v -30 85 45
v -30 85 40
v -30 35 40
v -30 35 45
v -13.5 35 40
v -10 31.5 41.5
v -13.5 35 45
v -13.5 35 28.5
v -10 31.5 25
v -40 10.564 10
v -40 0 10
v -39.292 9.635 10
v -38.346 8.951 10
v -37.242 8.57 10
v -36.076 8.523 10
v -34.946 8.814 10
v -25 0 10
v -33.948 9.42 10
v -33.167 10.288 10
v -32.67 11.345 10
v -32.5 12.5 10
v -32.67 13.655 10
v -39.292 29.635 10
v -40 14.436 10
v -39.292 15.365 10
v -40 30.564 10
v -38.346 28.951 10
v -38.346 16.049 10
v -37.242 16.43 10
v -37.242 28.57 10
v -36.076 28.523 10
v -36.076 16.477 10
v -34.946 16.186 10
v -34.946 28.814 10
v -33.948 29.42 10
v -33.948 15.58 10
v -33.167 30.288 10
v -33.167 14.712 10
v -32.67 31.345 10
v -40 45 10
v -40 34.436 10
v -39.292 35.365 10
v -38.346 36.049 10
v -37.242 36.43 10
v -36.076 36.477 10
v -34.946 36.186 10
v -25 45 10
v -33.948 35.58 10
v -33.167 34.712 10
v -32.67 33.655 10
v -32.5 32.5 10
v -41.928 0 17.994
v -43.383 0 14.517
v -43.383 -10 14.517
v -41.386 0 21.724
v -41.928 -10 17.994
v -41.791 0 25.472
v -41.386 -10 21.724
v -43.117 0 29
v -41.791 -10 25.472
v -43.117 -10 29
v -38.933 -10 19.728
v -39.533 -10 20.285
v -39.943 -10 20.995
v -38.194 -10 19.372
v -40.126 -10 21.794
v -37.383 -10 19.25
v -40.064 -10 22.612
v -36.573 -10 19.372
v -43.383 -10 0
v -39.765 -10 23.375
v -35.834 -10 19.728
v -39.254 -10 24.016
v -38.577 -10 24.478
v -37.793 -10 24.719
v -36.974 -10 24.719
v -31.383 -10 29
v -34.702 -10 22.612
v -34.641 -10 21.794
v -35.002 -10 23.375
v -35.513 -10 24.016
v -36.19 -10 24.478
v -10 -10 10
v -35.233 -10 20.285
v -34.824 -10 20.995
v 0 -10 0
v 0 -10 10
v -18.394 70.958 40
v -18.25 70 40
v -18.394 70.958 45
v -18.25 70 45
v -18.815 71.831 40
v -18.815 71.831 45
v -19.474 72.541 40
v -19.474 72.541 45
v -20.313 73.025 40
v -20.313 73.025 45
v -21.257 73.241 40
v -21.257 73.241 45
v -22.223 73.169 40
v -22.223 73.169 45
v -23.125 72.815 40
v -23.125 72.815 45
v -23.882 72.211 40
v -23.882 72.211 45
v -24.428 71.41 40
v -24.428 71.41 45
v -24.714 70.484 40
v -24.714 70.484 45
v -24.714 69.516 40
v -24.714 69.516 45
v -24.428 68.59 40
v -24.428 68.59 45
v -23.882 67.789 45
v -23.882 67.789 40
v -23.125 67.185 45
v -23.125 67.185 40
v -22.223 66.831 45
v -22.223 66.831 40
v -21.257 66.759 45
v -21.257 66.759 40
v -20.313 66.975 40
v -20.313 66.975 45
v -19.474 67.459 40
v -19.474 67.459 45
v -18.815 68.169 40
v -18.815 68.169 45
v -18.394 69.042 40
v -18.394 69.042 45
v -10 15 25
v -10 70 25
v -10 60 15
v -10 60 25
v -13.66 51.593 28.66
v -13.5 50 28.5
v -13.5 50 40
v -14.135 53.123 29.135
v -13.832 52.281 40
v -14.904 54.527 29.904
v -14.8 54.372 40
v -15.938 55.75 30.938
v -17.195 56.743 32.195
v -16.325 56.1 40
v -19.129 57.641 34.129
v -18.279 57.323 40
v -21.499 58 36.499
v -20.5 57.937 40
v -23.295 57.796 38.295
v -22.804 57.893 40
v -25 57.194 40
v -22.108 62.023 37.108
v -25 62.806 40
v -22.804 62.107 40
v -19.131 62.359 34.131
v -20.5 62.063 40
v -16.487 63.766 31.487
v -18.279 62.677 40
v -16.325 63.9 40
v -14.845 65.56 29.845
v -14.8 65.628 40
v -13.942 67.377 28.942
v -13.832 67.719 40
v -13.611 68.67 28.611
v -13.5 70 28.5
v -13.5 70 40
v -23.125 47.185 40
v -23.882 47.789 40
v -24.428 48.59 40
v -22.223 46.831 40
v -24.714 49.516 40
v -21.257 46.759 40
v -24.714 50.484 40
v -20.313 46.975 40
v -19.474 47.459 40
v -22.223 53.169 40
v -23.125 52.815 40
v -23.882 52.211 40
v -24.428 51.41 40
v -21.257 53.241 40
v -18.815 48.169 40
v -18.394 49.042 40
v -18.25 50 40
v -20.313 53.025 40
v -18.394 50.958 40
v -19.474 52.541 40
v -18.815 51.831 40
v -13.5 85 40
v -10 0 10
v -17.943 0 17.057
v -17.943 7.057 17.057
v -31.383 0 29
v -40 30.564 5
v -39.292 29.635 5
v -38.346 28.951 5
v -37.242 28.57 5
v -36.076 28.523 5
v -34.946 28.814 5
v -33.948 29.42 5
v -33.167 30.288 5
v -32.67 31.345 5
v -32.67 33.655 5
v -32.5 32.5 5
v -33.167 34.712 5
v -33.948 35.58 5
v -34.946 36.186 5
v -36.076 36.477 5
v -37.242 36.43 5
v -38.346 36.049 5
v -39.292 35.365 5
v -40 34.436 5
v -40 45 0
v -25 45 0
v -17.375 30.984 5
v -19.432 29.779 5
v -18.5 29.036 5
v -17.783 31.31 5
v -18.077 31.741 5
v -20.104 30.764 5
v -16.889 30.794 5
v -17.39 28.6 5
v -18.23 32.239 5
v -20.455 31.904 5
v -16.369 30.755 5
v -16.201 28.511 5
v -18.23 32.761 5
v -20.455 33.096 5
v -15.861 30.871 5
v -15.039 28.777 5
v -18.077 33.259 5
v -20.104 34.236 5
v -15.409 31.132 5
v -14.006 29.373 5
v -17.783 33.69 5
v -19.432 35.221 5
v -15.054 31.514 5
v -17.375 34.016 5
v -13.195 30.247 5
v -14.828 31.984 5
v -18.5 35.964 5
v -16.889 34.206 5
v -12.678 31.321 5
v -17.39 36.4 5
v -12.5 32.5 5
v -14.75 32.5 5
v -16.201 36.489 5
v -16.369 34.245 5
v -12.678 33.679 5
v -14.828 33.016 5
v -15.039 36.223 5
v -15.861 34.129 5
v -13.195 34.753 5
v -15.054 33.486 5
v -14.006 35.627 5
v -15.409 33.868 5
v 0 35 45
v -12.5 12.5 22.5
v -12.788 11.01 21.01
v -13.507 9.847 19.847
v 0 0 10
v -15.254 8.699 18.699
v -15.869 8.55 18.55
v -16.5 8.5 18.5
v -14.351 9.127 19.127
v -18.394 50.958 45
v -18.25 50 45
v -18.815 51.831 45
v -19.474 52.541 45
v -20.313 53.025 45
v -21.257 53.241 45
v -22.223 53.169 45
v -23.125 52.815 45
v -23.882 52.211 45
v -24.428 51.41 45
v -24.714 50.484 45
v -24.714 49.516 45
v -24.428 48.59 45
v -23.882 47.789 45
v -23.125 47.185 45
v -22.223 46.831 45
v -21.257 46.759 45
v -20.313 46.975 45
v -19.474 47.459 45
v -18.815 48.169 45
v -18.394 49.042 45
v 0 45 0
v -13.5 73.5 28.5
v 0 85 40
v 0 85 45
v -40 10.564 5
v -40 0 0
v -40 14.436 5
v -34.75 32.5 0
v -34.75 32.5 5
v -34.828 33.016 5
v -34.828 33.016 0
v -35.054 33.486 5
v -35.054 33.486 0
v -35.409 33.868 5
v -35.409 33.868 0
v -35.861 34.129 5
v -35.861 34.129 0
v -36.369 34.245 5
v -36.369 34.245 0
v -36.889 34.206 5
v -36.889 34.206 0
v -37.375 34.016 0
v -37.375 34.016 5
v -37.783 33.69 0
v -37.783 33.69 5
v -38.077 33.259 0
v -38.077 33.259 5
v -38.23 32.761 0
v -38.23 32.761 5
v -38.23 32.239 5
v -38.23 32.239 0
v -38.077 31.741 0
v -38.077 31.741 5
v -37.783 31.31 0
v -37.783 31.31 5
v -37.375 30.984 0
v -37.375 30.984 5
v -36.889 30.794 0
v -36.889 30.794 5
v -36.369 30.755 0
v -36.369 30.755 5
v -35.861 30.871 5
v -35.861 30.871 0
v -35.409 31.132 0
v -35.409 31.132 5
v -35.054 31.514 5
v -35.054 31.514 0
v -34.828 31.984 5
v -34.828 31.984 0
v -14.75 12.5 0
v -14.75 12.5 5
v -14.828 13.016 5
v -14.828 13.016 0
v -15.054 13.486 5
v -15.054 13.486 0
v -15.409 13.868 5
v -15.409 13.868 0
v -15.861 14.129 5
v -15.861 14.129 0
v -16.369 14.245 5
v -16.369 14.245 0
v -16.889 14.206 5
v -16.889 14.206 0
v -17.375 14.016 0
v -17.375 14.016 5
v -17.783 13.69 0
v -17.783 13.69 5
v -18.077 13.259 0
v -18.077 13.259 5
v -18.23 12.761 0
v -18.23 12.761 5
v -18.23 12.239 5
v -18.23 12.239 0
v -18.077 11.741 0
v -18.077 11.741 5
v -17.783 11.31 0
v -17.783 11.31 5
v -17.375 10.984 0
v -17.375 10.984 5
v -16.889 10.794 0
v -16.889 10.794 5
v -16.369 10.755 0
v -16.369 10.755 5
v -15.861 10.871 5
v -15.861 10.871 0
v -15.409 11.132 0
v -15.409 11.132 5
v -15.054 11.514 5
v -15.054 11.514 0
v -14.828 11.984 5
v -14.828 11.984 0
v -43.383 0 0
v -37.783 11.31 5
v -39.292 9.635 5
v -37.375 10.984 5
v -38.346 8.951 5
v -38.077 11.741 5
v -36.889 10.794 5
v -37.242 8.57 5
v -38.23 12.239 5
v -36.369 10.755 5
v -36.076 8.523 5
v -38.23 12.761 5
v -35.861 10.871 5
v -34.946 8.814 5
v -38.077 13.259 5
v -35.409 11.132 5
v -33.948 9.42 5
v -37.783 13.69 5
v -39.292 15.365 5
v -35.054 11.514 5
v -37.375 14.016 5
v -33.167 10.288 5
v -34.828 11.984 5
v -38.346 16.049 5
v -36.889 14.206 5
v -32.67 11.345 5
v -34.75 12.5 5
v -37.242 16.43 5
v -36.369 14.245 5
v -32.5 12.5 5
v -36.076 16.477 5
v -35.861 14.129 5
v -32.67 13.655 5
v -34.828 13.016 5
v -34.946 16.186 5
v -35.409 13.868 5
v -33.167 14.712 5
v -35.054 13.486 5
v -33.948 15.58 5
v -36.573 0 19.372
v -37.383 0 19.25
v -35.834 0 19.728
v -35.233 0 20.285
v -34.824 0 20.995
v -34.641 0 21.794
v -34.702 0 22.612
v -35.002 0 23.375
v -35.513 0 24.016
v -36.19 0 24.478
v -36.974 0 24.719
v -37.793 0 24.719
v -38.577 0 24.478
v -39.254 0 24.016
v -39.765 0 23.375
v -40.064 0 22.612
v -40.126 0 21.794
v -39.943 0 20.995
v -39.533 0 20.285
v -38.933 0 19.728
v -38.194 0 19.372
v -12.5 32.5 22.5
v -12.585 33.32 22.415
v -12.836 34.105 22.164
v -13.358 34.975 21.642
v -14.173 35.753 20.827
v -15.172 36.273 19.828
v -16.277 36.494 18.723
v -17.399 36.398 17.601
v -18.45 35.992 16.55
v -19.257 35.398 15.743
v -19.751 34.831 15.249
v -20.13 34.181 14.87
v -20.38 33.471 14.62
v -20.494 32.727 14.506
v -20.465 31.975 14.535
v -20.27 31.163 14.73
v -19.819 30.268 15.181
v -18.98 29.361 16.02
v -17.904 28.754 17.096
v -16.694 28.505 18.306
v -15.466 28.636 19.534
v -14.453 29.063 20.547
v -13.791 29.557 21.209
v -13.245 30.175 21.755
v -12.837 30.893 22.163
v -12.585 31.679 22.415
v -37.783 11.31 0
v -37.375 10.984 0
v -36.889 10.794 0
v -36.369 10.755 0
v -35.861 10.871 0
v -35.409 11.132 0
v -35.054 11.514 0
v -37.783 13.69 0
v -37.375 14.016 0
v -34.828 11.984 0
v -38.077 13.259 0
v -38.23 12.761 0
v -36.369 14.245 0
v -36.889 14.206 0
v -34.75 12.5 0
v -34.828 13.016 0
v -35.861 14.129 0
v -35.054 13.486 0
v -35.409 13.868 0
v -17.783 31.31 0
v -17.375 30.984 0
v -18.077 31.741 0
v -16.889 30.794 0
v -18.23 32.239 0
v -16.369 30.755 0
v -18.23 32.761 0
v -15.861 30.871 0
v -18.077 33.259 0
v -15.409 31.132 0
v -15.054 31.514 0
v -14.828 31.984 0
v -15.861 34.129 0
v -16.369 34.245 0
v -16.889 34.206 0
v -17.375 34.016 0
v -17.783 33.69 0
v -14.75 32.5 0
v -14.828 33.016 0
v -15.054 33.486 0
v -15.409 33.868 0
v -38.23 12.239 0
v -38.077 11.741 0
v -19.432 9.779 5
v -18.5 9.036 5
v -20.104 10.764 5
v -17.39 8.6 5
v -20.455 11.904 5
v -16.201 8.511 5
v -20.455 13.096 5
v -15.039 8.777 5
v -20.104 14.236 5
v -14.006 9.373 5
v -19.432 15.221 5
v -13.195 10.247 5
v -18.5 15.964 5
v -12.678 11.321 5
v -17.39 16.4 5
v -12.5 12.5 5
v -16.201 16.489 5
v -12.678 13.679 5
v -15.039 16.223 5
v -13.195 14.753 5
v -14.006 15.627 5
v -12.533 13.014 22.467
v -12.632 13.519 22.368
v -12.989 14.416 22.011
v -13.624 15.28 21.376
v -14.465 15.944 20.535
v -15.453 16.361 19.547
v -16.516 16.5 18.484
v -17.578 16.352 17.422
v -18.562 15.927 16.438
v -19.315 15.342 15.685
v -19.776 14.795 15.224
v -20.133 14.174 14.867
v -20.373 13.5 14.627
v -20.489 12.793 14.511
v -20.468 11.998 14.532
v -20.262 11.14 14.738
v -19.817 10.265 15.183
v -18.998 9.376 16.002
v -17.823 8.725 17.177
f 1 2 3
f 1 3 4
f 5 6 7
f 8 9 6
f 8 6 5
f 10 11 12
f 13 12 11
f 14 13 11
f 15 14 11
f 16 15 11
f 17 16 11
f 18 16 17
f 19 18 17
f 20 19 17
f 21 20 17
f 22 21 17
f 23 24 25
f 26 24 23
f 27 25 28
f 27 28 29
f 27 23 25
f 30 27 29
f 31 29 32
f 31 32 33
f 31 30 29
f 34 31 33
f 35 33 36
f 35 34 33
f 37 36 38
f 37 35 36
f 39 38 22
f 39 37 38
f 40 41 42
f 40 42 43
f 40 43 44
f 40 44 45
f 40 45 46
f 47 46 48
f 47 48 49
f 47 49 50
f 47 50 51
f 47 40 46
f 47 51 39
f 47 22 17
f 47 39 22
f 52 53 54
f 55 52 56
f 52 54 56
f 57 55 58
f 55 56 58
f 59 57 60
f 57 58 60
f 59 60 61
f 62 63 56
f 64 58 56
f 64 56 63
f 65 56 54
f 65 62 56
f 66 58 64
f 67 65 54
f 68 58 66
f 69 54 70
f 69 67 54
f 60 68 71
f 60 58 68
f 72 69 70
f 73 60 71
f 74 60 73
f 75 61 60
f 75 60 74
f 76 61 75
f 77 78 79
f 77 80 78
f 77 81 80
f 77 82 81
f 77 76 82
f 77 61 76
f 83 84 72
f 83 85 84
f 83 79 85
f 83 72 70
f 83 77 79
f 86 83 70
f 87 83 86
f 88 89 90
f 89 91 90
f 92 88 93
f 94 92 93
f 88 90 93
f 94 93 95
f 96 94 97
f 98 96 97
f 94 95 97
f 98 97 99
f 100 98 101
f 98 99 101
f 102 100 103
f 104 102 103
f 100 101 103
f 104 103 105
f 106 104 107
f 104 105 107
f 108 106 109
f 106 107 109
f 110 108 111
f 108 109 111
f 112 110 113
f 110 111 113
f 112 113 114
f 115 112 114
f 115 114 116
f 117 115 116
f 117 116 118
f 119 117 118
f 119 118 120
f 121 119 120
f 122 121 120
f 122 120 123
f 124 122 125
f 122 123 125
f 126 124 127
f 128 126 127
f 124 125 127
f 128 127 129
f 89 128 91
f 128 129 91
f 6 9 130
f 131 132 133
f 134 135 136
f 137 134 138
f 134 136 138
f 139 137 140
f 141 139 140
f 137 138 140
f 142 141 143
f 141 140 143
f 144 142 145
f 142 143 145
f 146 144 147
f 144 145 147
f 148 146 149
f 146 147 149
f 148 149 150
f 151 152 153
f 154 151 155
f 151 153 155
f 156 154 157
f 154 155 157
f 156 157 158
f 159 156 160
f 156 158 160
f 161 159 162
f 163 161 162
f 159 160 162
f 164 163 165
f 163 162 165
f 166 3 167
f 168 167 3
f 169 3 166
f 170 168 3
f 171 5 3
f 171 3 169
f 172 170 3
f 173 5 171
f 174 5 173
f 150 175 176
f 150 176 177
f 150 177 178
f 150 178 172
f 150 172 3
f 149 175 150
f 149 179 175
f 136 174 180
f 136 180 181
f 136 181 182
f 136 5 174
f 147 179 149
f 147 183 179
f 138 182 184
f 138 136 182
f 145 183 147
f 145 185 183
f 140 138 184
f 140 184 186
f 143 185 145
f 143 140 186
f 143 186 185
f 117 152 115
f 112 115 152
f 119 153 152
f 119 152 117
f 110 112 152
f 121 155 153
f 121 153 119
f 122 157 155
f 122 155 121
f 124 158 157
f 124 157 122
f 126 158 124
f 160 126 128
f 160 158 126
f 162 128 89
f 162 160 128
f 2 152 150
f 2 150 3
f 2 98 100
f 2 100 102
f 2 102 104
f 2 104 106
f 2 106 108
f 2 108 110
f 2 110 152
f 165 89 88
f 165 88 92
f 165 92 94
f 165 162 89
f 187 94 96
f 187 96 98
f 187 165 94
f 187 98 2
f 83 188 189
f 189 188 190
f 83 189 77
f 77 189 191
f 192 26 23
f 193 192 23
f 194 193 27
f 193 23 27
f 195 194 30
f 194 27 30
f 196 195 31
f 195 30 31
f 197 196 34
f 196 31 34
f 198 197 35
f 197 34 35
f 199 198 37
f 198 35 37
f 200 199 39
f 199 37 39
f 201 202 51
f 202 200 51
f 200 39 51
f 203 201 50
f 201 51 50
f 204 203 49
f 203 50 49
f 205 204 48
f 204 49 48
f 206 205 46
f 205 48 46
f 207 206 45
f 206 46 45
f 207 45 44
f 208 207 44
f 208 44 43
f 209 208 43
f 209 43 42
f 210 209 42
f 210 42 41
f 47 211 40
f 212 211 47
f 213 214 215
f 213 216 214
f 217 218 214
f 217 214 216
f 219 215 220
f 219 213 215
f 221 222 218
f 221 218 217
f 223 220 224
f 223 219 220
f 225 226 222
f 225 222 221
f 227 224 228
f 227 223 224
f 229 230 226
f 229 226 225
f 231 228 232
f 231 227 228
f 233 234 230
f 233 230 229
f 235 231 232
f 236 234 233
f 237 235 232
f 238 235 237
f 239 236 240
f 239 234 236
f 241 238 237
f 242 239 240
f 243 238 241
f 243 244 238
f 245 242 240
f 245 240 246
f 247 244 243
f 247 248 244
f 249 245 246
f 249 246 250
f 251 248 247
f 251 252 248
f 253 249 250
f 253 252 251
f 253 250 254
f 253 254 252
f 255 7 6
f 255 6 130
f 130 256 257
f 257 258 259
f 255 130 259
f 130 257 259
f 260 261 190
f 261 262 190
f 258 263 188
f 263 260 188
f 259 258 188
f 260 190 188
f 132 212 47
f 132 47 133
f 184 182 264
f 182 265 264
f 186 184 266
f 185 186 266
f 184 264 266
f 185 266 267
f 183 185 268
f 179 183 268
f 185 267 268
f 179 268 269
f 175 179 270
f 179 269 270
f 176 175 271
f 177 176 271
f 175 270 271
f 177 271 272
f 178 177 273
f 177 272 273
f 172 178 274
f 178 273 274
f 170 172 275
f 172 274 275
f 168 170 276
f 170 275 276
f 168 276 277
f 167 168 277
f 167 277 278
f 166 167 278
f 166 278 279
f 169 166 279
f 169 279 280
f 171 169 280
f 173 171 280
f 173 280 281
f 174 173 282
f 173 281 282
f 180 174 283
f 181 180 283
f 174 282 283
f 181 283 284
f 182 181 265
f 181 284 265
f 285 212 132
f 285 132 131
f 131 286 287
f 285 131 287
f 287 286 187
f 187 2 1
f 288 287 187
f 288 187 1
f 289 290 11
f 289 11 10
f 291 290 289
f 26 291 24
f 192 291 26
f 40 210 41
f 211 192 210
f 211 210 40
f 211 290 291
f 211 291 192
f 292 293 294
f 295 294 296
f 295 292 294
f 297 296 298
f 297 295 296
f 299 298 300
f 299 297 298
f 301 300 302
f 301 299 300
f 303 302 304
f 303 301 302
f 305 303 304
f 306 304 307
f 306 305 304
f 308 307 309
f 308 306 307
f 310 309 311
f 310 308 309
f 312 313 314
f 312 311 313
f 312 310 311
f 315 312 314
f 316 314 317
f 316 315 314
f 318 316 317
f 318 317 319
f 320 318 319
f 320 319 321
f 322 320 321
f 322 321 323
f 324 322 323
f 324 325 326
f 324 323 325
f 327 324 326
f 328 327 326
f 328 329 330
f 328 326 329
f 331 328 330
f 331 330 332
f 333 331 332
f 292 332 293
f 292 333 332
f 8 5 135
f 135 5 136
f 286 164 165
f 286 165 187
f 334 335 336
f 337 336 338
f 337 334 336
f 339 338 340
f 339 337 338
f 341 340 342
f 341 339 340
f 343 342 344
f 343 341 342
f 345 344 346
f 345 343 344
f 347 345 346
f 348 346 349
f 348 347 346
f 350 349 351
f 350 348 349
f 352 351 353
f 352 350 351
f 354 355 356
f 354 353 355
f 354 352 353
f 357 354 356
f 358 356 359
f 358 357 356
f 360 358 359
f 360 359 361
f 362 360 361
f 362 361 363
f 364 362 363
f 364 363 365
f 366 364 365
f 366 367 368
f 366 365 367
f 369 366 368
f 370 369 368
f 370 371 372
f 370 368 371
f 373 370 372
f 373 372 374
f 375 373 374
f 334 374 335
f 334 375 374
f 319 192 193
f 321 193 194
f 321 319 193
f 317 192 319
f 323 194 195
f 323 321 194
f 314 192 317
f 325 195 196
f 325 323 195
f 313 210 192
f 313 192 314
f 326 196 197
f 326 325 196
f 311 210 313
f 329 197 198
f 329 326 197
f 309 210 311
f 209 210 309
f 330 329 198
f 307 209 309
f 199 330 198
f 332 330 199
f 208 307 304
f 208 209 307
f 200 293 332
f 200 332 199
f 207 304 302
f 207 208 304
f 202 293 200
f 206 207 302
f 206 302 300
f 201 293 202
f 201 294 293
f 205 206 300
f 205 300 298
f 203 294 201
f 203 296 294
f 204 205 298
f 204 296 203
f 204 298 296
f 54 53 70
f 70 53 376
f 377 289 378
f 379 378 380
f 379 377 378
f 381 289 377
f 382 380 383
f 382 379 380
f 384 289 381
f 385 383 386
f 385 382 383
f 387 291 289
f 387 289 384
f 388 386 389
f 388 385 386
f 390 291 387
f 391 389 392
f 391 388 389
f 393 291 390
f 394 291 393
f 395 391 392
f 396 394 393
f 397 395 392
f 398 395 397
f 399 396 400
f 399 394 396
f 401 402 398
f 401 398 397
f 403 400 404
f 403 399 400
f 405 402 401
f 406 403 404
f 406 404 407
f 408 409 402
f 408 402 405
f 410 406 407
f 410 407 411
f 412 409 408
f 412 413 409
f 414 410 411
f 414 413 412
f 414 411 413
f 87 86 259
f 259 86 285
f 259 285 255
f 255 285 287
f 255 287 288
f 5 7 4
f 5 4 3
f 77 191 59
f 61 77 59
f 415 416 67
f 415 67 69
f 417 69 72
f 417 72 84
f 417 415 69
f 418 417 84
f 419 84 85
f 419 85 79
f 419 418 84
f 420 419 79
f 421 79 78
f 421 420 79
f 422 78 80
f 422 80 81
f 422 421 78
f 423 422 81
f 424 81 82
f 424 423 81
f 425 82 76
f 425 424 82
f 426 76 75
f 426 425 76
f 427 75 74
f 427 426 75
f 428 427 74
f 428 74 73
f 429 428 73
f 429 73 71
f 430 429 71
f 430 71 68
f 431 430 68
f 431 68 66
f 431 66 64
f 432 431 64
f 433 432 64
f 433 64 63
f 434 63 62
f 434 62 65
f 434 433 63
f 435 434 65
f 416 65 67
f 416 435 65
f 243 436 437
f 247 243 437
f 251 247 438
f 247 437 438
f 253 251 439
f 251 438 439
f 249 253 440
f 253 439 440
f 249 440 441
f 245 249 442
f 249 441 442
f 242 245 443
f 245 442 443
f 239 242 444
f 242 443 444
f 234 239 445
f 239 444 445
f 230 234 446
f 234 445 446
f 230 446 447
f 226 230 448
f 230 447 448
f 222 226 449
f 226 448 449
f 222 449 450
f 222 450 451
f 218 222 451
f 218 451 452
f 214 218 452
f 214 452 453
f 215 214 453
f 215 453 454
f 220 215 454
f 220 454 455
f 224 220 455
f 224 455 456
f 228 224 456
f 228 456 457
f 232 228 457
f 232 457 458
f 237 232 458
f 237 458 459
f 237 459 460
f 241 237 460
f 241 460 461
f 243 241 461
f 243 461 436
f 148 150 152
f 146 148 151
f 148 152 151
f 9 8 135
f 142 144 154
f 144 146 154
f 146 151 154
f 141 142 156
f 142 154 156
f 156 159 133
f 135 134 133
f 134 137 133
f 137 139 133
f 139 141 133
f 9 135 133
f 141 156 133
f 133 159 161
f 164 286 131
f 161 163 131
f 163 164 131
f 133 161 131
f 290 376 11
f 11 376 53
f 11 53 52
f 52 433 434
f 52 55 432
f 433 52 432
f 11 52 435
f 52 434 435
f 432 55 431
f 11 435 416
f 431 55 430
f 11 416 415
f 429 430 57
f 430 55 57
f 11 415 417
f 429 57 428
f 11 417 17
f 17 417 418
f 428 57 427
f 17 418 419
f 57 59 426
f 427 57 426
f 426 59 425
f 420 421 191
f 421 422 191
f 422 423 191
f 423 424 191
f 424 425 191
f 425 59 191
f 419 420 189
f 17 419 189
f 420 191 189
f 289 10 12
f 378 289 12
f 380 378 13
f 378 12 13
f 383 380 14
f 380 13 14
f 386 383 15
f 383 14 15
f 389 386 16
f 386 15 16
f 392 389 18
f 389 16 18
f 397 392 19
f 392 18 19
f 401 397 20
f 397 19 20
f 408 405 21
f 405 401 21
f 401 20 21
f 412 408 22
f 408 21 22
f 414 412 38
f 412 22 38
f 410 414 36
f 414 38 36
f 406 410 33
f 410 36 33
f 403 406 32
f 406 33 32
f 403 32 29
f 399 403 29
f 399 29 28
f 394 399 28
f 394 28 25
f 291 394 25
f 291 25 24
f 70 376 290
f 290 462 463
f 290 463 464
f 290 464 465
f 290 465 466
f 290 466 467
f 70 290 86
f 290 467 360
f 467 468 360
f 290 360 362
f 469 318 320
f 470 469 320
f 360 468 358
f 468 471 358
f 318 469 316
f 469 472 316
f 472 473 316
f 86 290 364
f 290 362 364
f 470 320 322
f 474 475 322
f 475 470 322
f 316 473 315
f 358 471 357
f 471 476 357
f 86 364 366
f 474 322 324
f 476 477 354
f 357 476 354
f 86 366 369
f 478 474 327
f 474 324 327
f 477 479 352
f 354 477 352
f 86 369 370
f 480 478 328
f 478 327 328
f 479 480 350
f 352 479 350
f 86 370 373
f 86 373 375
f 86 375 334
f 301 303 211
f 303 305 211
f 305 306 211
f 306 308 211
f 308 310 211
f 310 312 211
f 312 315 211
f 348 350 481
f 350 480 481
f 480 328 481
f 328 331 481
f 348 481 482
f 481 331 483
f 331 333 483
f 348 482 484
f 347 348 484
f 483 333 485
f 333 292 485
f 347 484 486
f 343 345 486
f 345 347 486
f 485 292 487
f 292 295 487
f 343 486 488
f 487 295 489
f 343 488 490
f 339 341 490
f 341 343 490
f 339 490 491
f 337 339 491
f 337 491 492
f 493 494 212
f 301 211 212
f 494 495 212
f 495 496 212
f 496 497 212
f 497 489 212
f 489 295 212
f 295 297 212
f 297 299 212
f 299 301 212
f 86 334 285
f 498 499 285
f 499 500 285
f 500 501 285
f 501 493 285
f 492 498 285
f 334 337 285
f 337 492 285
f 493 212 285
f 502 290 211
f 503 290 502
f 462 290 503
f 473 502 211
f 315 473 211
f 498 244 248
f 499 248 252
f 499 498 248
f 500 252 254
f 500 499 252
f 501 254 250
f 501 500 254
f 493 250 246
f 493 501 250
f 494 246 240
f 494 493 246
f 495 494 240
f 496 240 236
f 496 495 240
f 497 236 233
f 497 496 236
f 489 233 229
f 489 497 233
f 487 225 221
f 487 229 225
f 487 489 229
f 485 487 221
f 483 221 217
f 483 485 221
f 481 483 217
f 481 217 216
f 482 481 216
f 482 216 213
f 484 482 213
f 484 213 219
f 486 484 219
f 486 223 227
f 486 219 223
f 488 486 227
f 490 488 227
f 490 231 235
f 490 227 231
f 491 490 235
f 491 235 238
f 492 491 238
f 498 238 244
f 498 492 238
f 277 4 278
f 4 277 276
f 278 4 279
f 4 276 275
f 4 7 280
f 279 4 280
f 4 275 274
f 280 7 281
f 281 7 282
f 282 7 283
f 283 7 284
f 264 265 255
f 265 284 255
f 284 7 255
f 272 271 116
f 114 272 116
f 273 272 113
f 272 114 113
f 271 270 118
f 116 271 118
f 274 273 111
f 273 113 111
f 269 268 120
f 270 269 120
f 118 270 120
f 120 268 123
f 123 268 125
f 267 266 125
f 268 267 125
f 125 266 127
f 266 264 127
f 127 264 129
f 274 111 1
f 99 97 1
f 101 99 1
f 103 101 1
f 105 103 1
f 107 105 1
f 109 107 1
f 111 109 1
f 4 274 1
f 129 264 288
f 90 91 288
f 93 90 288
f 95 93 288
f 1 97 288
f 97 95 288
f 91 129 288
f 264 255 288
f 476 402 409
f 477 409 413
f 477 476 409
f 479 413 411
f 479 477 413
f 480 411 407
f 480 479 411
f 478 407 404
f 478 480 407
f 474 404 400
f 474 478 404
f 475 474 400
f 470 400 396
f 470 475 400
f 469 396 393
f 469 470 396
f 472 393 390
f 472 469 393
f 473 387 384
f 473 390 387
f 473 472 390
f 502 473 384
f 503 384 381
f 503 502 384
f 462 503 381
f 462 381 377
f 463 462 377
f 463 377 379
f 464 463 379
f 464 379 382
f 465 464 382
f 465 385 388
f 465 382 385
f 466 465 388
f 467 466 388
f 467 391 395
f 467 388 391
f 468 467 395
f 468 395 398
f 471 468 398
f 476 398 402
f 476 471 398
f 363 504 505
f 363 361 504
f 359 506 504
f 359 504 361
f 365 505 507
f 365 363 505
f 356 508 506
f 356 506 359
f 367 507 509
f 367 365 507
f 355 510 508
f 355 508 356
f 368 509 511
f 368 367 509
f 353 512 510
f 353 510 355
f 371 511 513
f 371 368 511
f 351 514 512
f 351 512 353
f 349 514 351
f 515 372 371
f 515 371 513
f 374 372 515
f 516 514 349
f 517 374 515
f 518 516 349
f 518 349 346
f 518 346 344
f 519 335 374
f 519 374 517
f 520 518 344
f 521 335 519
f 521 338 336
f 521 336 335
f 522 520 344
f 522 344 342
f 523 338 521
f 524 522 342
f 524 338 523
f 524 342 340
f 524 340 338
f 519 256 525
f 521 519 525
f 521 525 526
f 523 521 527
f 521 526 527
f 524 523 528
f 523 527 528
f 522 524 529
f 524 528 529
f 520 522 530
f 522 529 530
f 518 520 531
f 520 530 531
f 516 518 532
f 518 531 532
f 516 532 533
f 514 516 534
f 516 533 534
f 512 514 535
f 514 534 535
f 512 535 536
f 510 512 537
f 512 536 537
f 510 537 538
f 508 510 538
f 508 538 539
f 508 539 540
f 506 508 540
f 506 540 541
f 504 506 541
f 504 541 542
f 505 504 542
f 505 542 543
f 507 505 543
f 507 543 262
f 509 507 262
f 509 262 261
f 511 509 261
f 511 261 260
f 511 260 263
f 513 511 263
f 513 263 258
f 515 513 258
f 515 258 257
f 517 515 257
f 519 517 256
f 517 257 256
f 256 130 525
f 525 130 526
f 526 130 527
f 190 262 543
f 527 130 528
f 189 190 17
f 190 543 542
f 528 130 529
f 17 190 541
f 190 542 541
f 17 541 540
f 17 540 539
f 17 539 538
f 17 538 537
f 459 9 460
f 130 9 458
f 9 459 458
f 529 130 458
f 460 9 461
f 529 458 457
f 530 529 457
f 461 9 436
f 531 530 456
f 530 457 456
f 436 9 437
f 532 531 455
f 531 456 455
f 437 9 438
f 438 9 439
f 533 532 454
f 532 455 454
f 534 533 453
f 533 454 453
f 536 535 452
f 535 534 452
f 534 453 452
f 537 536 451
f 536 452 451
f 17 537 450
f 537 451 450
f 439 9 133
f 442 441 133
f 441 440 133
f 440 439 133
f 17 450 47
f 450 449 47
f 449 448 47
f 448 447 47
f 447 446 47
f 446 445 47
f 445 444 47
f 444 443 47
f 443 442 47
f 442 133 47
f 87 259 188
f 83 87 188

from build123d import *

# Parameters (mm, degrees)
ESQUISSE1_W             = 40
ESQUISSE1_H             = 45
ESQUISSE1_R             = 1.75
BOSS_EXTRU_1_DEPTH      = 10
ESQUISSE2_R             = 4
ENL_V_MAT_EXTRU_2_DEPTH = 5
BOSS_EXTRU_2_DEPTH      = 10
ESQUISSE4_W             = 5
ESQUISSE4_H             = 50
BOSS_EXTRU_3_DEPTH      = 20
ENL_V_MAT_EXTRU_3_REACH = 106.163
ESQUISSE5_R             = 3.25
ESQUISSE7_R             = 2.75
BOSS_EXTRU_4_DEPTH      = 10
ENL_V_MAT_EXTRU_5_REACH = 115.719
ESQUISSE8_R             = 15
CHANFREIN1_SIZE         = 15
ENL_V_MAT_EXTRU_4_REACH = 105.475
CHANFREIN3_SIZE         = 3.5


with BuildPart() as part:
    # Esquisse1 → Boss.-Extru.1 (new body)
    with BuildSketch(Plane.XY):
        with Locations((-20, 22.5)):
            Rectangle(ESQUISSE1_W, ESQUISSE1_H)
        with Locations((-16.5, 32.5)):
            Circle(ESQUISSE1_R, mode=Mode.SUBTRACT)
        with Locations((-36.5, 32.5)):
            Circle(ESQUISSE1_R, mode=Mode.SUBTRACT)
        with Locations((-36.5, 12.5)):
            Circle(ESQUISSE1_R, mode=Mode.SUBTRACT)
        with Locations((-16.5, 12.5)):
            Circle(ESQUISSE1_R, mode=Mode.SUBTRACT)
    extrude(amount=BOSS_EXTRU_1_DEPTH)

    # Esquisse2 → Enlèv. mat.-Extru.2 (cut)
    with BuildSketch(Plane.XY.offset(10)):
        with Locations((-36.5, 32.5)):
            Circle(ESQUISSE2_R)
        with Locations((-16.5, 32.5)):
            Circle(ESQUISSE2_R)
        with Locations((-36.5, 12.5)):
            Circle(ESQUISSE2_R)
        with Locations((-16.5, 12.5)):
            Circle(ESQUISSE2_R)
    extrude(amount=-ENL_V_MAT_EXTRU_2_DEPTH, mode=Mode.SUBTRACT)

    # Esquisse3 → Boss.-Extru.2 (add)
    with BuildSketch(Plane.ZY):
        Polygon((10, 0), (45, 35), (45, 85), (40, 85), (0, 45), (10, 45), align=None)
    extrude(amount=BOSS_EXTRU_2_DEPTH)

    # Esquisse4 → Boss.-Extru.3 (add)
    with BuildSketch(Plane.ZY.offset(10)):
        with Locations((42.5, 60)):
            Rectangle(ESQUISSE4_W, ESQUISSE4_H)
    extrude(amount=BOSS_EXTRU_3_DEPTH)

    # Esquisse5 → Enlèv. mat.-Extru.3 (cut, up to next)
    with BuildSketch(Plane.XY.offset(45), mode=Mode.PRIVATE) as enl_v_mat_extru_3_sk1:
        with Locations((-21.5, 70)):
            Circle(ESQUISSE5_R)
    enl_v_mat_extru_3_tool1 = extrude(enl_v_mat_extru_3_sk1.sketch, amount=-ENL_V_MAT_EXTRU_3_REACH, mode=Mode.PRIVATE) & part.part
    # Esquisse5 → Enlèv. mat.-Extru.3 (cut, up to next)
    with BuildSketch(Plane.XY.offset(45), mode=Mode.PRIVATE) as enl_v_mat_extru_3_sk2:
        with Locations((-21.5, 50)):
            Circle(ESQUISSE5_R)
    enl_v_mat_extru_3_tool2 = extrude(enl_v_mat_extru_3_sk2.sketch, amount=-ENL_V_MAT_EXTRU_3_REACH, mode=Mode.PRIVATE) & part.part
    add(enl_v_mat_extru_3_tool1.solids().sort_by_distance((-21.5, 70, 45))[0], mode=Mode.SUBTRACT)
    add(enl_v_mat_extru_3_tool2.solids().sort_by_distance((-21.5, 50, 45))[0], mode=Mode.SUBTRACT)

    # Esquisse7 → Boss.-Extru.4 (add)
    with BuildSketch(Plane.XZ):
        Polygon((0, 0), (0, 10), (-10, 10), (-31.3834406, 29), (-43.3834406, 29), (-43.3834406, 0), align=None)
        with Locations(Location((-37.3834406, 22, 0), (0, 0, 270))):
            Circle(ESQUISSE7_R, mode=Mode.SUBTRACT)
    extrude(amount=BOSS_EXTRU_4_DEPTH)

    # Esquisse8 → Enlèv. mat.-Extru.5 (cut, up to next)
    with BuildSketch(Plane.XZ.offset(10), mode=Mode.PRIVATE) as enl_v_mat_extru_5_sk1:
        with Locations((-56.3834406, 22)):
            Circle(ESQUISSE8_R)
    enl_v_mat_extru_5_tool1 = extrude(enl_v_mat_extru_5_sk1.sketch, amount=-ENL_V_MAT_EXTRU_5_REACH, mode=Mode.PRIVATE) & part.part
    add(enl_v_mat_extru_5_tool1.solids().sort_by_distance((-56.383441, -10, 22))[0], mode=Mode.SUBTRACT)

    # Chanfrein1
    # the kernel refuses this chamfer: 15 mm, written as the material it adds along each edge
    with BuildSketch(Plane(origin=(-10, 35, 40), x_dir=(0, 0, -1), z_dir=(0, 1, 0))) as chanfrein1_piece_1_section:
        Polygon((CHANFREIN1_SIZE, 0), (0, CHANFREIN1_SIZE), (0, 0), align=None)
    chanfrein1_piece_1 = extrude(amount=88.575244819, mode=Mode.PRIVATE)
    chanfrein1_piece_1 = split(chanfrein1_piece_1, bisect_by=Plane(origin=(-10, 60, 15), z_dir=(0, -0.707106781186543, 0.7071067811865521)), keep=Keep.TOP, mode=Mode.PRIVATE)
    chanfrein1_piece_1 = chanfrein1_piece_1 - Plane(origin=(-21.5, 50, 40), x_dir=(1, 0, 0), z_dir=(0, 0, 1)) * Cylinder(3.25, 238, mode=Mode.PRIVATE)
    chanfrein1_piece_1 = chanfrein1_piece_1 - Plane(origin=(-21.5, 70, 40), x_dir=(1, 0, 0), z_dir=(0, 0, 1)) * Cylinder(3.25, 238, mode=Mode.PRIVATE)
    add(chanfrein1_piece_1)
    with BuildSketch(Plane(origin=(-10, 83.575244819, 10), x_dir=(0, 0, 1), z_dir=(0, -1, 0))) as chanfrein1_piece_2_section:
        Polygon((CHANFREIN1_SIZE, 0), (0, CHANFREIN1_SIZE), (0, 0), align=None)
    chanfrein1_piece_2 = extrude(amount=122.150489639, mode=Mode.PRIVATE)
    chanfrein1_piece_2 = split(chanfrein1_piece_2, bisect_by=Plane(origin=(-10, 69.28762241, 24.28762241), z_dir=(0, -0.707106781186543, 0.7071067811865521)), keep=Keep.TOP, mode=Mode.PRIVATE)
    chanfrein1_piece_2 = split(chanfrein1_piece_2, bisect_by=Plane(origin=(-10, 41.78762241, 51.78762241), z_dir=(0, 0.7071067811865328, -0.7071067811865622)), keep=Keep.TOP, mode=Mode.PRIVATE)
    chanfrein1_piece_2 = chanfrein1_piece_2 - Plane(origin=(-16.5, 12.5, 10), x_dir=(1, 0, 0), z_dir=(0, 0, 1)) * Cylinder(4, 305, mode=Mode.PRIVATE)
    chanfrein1_piece_2 = chanfrein1_piece_2 - Plane(origin=(-16.5, 32.5, 10), x_dir=(1, 0, 0), z_dir=(0, 0, 1)) * Cylinder(4, 305, mode=Mode.PRIVATE)
    chanfrein1_piece_2 = split(chanfrein1_piece_2, bisect_by=Plane(origin=(1.78762241, 71.78762241, 10), z_dir=(0.7071067811865477, -0.7071067811865474, 0)), keep=Keep.TOP, mode=Mode.PRIVATE)
    add(chanfrein1_piece_2)
    with BuildSketch(Plane(origin=(-10, 83.575244819, 10), x_dir=(0, 0, 1), z_dir=(0, -1, 0))) as chanfrein1_piece_3_section:
        Polygon((CHANFREIN1_SIZE, 0), (0, CHANFREIN1_SIZE), (0, 0), align=None)
    chanfrein1_piece_3 = extrude(amount=83.575244819, mode=Mode.PRIVATE)
    chanfrein1_piece_3 = split(chanfrein1_piece_3, bisect_by=Plane(origin=(-10, 41.78762241, 51.78762241), z_dir=(0, -0.7071067811865328, 0.7071067811865622)), keep=Keep.TOP, mode=Mode.PRIVATE)
    chanfrein1_piece_3 = split(chanfrein1_piece_3, bisect_by=Plane(origin=(-10, 83.575244819, 10), z_dir=(-0.6642173069108601, 0, -0.7475395435694919)), keep=Keep.TOP, mode=Mode.PRIVATE)
    add(chanfrein1_piece_3)
    with BuildSketch(Plane(origin=(-10, 45, -38.575244819), x_dir=(-1, 0, 0), z_dir=(0, 0, 1))) as chanfrein1_piece_4_section:
        Polygon((CHANFREIN1_SIZE, 0), (0, -CHANFREIN1_SIZE), (0, 0), align=None)
    chanfrein1_piece_4 = extrude(amount=87.150489639, mode=Mode.PRIVATE)
    chanfrein1_piece_4 = split(chanfrein1_piece_4, bisect_by=Plane(origin=(-10, 25.71237759, -19.28762241), z_dir=(0, -0.707106781186543, 0.7071067811865521)), keep=Keep.TOP, mode=Mode.PRIVATE)
    chanfrein1_piece_4 = split(chanfrein1_piece_4, bisect_by=Plane(origin=(-41.78762241, 45, -6.78762241), z_dir=(0.7071067811865476, 0, -0.7071067811865476)), keep=Keep.TOP, mode=Mode.PRIVATE)
    add(chanfrein1_piece_4)

    # Esquisse6 → Enlèv. mat.-Extru.4 (cut, up to next)
    with BuildSketch(Plane(origin=(0, 0, 40), x_dir=(-1, 0, 0), z_dir=(0, 0, -1)), mode=Mode.PRIVATE) as enl_v_mat_extru_4_sk1:
        with BuildLine():
            Line((13.5, 70), (13.5, 85))
            Line((13.5, 85), (29.5, 85))
            Line((29.5, 85), (29.5, 70))
            ThreePointArc((29.5, 70), (21.5, 62), (13.5, 70))
        make_face()
    enl_v_mat_extru_4_tool1 = extrude(enl_v_mat_extru_4_sk1.sketch, amount=ENL_V_MAT_EXTRU_4_REACH, mode=Mode.PRIVATE) & part.part
    # Esquisse6 → Enlèv. mat.-Extru.4 (cut, up to next)
    with BuildSketch(Plane(origin=(0, 0, 40), x_dir=(-1, 0, 0), z_dir=(0, 0, -1)), mode=Mode.PRIVATE) as enl_v_mat_extru_4_sk2:
        with BuildLine():
            Line((29.5, 50), (29.5, 35))
            Line((29.5, 35), (13.5, 35))
            Line((13.5, 35), (13.5, 50))
            ThreePointArc((13.5, 50), (21.5, 58), (29.5, 50))
        make_face()
    enl_v_mat_extru_4_tool2 = extrude(enl_v_mat_extru_4_sk2.sketch, amount=ENL_V_MAT_EXTRU_4_REACH, mode=Mode.PRIVATE) & part.part
    add(enl_v_mat_extru_4_tool1.solids().sort_by_distance((-21.5, 74.283507, 40))[0], mode=Mode.SUBTRACT)
    add(enl_v_mat_extru_4_tool2.solids().sort_by_distance((-21.5, 45.716493, 40))[0], mode=Mode.SUBTRACT)

    # Chanfrein3
    # the kernel refuses this chamfer: 3.5 mm, written as the material it adds along each edge
    with BuildSketch(Plane(origin=(-10, 35, 15.999109542), x_dir=(0, -1, 0), z_dir=(0, 0, 1))) as chanfrein3_piece_1_section:
        Polygon((CHANFREIN3_SIZE, 0), (0, -CHANFREIN3_SIZE), (0, 0), align=None)
    chanfrein3_piece_1 = extrude(amount=38.001780916, mode=Mode.PRIVATE)
    chanfrein3_piece_1 = split(chanfrein3_piece_1, bisect_by=Plane(origin=(-10, 20.499554771, 30.499554771), z_dir=(0, 0.7071067811865476, -0.7071067811865476)), keep=Keep.TOP, mode=Mode.PRIVATE)
    chanfrein3_piece_1 = split(chanfrein3_piece_1, bisect_by=Plane(origin=(-5.499554771, 35, 20.499554771), z_dir=(0.7071067811865476, 0, 0.7071067811865476)), keep=Keep.TOP, mode=Mode.PRIVATE)
    add(chanfrein3_piece_1)


solid = part.part
